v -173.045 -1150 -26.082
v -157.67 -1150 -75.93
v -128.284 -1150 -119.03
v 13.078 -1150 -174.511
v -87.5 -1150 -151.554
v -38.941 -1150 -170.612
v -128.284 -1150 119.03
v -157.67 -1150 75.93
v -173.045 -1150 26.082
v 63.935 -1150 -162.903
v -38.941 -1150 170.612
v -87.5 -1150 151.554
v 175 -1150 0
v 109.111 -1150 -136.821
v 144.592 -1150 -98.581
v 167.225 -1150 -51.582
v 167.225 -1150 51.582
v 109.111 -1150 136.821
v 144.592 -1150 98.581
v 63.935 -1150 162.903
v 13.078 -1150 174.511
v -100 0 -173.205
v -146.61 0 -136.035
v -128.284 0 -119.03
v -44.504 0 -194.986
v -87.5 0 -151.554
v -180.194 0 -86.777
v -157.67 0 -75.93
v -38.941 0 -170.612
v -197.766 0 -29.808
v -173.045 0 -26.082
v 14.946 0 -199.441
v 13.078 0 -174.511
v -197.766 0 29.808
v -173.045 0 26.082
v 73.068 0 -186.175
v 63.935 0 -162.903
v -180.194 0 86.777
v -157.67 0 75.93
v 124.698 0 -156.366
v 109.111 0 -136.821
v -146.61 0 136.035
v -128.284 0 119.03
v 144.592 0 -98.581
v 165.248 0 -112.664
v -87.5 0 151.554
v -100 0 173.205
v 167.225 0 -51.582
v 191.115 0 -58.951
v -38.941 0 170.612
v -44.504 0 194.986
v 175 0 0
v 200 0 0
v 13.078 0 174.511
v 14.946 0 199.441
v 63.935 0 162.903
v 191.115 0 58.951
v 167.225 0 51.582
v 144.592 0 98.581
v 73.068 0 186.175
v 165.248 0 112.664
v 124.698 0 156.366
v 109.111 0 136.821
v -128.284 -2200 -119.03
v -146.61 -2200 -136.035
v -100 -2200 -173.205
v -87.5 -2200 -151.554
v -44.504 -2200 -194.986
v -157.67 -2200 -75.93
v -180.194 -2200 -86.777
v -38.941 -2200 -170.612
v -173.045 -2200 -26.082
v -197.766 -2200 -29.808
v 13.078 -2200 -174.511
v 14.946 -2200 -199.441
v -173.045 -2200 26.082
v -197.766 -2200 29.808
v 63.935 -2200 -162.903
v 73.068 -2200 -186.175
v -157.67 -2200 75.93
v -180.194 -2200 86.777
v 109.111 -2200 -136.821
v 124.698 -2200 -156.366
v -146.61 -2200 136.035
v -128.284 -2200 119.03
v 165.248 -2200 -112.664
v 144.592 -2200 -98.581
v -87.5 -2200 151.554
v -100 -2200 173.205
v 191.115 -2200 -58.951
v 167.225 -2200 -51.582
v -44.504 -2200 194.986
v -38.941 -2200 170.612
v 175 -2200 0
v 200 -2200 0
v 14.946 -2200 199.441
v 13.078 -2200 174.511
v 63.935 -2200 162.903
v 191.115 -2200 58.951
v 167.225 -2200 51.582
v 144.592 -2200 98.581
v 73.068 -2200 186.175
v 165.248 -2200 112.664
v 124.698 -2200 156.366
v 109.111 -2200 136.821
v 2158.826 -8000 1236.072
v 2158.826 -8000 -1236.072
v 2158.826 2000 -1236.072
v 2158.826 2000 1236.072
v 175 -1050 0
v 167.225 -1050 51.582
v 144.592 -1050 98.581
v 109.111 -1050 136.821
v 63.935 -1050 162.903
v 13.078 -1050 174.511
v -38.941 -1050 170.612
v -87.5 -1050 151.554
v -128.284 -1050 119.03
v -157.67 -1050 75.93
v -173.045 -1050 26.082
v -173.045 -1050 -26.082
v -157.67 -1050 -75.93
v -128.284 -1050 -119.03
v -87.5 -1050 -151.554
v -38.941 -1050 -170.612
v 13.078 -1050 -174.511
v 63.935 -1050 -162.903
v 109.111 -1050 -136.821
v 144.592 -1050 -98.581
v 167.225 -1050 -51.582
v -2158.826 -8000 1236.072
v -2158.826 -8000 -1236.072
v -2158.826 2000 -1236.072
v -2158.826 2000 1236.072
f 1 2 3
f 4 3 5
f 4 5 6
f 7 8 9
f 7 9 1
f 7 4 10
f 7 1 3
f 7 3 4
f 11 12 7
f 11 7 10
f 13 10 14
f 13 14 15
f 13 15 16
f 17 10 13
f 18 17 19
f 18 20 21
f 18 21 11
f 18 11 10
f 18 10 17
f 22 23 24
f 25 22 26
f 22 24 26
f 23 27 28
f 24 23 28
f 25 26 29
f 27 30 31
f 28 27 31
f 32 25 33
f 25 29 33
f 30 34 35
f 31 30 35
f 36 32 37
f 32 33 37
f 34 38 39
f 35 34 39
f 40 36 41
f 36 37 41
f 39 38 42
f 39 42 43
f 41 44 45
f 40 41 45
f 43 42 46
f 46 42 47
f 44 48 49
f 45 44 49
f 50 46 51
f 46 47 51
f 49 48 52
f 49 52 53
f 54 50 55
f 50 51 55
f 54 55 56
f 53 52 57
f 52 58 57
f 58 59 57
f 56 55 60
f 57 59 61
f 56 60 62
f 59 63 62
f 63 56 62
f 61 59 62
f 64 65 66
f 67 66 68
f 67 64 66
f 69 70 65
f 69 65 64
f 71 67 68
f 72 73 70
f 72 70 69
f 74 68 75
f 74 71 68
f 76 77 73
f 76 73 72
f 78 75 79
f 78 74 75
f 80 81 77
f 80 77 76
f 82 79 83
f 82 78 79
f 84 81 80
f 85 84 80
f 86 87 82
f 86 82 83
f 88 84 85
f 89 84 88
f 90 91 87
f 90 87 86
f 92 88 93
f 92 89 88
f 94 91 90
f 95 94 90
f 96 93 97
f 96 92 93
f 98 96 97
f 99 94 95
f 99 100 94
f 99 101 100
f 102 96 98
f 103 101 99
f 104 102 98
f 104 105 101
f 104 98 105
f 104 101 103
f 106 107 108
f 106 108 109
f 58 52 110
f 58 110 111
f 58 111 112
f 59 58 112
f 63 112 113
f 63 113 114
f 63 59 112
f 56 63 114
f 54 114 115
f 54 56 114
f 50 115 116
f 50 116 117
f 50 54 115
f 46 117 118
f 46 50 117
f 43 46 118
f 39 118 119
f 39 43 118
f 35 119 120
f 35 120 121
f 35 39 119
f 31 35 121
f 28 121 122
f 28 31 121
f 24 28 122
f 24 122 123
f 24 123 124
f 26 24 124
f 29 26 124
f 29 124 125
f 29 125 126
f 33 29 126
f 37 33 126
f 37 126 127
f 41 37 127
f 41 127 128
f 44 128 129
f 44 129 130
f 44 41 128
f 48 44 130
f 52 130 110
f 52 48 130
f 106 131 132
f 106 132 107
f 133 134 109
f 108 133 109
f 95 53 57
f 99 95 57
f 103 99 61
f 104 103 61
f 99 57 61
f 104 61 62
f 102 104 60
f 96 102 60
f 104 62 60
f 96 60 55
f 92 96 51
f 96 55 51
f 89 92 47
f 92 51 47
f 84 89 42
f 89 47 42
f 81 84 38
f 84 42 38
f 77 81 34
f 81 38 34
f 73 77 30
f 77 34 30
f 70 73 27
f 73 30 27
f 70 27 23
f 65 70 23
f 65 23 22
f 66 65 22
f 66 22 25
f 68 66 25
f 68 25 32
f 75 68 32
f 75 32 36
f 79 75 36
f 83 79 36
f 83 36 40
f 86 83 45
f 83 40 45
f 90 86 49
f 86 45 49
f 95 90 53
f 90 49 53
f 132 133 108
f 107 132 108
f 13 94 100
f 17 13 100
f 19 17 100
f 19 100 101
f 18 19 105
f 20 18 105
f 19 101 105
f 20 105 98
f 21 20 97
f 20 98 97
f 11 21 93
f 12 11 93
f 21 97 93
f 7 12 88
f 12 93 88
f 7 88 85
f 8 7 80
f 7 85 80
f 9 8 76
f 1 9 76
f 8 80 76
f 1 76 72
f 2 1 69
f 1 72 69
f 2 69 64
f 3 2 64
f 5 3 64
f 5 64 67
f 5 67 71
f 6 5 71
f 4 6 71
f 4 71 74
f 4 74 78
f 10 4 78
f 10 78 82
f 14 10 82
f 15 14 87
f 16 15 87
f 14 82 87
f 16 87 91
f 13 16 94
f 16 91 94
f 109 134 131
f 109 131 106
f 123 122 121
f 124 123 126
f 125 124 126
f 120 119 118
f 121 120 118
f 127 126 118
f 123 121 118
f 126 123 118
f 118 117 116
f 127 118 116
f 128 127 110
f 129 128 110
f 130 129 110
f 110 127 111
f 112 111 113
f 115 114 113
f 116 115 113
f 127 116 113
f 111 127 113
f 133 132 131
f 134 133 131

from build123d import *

# Parameters (mm, degrees)
F0_R     = 200
F1_DEPTH = 2200
F2_R     = 175
F3_DEPTH = 1050
F4_R     = 175
F5_DEPTH = 1050
F7_W     = 4317.6512718201
F7_H     = 2472.1434116364
F8_DEPTH = 10000


with BuildPart() as f1:
    # F0 (on Front) → F1 (new body)
    with BuildSketch(Plane.XZ):
        Circle(F0_R)
    extrude(amount=F1_DEPTH)

    # F2 (on Front) → F3 (cut)
    with BuildSketch(Plane.XZ):
        Circle(F2_R)
    extrude(amount=F3_DEPTH, mode=Mode.SUBTRACT)

    # F4 (on face) → F5 (cut)
    with BuildSketch(Plane.XZ.offset(2200)):
        Circle(F4_R)
    extrude(amount=-F5_DEPTH, mode=Mode.SUBTRACT)


with BuildPart() as f8:
    # F7 (on offset) → F8 (new body)
    with BuildSketch(Plane.XZ.offset(-2000)):
        Rectangle(F7_W, F7_H)
    extrude(amount=F8_DEPTH)


solid = Compound([f1.part, f8.part])
